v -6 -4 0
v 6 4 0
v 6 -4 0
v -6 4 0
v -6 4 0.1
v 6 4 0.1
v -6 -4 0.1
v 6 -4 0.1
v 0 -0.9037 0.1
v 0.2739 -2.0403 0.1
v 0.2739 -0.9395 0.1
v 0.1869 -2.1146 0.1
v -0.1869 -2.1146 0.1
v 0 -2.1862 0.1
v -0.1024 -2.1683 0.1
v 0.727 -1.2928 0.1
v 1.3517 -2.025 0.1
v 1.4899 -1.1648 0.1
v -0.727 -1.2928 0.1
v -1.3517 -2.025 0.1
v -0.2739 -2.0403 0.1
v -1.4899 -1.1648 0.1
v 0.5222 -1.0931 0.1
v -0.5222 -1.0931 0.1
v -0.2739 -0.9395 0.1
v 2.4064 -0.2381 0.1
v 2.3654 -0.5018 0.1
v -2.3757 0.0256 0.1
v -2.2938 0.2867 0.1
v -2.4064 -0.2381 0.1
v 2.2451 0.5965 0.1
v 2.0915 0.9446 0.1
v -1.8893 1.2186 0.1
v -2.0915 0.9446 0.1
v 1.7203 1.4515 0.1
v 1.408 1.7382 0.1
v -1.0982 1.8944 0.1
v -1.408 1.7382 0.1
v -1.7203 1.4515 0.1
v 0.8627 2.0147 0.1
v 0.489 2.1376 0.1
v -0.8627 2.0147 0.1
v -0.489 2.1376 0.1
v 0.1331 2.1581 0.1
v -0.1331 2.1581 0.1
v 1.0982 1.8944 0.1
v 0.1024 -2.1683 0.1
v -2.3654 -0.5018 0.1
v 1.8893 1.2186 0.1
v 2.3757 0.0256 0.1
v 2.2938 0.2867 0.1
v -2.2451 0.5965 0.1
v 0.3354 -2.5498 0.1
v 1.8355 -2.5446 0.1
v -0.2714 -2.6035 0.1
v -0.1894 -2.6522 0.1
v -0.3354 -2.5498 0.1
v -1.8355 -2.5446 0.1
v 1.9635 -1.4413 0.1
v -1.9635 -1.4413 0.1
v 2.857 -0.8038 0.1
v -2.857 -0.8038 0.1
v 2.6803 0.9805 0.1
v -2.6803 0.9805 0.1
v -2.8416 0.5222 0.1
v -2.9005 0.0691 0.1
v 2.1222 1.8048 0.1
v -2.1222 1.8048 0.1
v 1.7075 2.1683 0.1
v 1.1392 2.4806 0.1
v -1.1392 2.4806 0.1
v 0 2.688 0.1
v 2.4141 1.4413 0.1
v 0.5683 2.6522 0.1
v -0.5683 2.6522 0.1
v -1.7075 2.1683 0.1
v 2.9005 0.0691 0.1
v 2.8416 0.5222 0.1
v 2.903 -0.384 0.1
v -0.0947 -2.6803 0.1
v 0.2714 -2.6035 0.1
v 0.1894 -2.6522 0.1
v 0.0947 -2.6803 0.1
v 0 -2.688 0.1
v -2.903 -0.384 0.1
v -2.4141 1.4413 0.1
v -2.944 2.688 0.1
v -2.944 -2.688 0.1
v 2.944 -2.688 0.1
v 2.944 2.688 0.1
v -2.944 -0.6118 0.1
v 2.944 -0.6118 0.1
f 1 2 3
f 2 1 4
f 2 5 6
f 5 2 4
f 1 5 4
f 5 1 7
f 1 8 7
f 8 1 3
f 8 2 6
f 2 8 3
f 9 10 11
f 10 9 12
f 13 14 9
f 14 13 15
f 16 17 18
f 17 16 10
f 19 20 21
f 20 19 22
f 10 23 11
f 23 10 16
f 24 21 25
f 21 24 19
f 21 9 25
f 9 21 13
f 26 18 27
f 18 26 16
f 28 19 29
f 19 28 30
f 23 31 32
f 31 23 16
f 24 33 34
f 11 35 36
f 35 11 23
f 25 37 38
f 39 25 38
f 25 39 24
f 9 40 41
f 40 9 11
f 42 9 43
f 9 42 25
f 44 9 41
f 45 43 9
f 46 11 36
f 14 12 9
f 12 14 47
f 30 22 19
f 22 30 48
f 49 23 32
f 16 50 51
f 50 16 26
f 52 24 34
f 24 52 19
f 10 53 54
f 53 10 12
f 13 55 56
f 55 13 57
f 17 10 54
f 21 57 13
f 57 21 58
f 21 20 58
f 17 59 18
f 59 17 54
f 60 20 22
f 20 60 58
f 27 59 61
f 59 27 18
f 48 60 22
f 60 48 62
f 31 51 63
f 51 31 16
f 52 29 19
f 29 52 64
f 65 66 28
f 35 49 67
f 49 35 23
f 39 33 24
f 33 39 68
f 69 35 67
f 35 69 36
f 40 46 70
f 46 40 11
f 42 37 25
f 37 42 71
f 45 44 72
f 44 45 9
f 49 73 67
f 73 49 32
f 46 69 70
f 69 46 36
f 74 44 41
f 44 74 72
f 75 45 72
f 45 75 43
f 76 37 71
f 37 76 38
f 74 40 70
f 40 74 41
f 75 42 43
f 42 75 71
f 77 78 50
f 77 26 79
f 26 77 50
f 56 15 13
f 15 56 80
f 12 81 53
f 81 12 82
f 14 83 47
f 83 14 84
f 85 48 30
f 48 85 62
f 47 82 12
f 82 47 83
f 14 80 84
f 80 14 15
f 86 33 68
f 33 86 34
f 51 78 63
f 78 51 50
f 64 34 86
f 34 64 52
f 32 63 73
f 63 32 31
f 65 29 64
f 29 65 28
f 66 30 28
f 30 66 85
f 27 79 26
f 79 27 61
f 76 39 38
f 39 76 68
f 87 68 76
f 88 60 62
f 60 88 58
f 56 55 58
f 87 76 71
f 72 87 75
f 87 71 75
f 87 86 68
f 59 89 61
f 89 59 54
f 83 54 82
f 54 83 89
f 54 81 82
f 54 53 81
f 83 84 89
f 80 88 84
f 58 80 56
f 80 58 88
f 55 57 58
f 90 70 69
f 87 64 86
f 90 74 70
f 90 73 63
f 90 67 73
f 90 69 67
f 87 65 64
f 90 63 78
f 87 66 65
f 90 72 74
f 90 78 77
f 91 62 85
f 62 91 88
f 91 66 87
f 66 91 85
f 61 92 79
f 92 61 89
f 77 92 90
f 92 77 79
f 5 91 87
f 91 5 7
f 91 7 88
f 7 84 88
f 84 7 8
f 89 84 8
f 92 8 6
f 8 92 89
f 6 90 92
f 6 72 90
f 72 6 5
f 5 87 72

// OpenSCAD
// file: ../p/logo-shell-1971-outerbox.scad
use <../lib.scad>
function ldraw_lib__logo_shell_1971_outerbox() = [
// 0 Logo Shell 1971 Outerbox
// 0 Name: logo-shell-1971-outerbox.dat
// 0 Author: Vincent Messenet [Cheenzo]
// 0 !LDRAW_ORG Primitive UPDATE 2023-04
// 0 !LICENSE Licensed under CC BY 4.0 : see CAreadme.txt
// 
// 0 BFC CERTIFY CCW
  [0,"BFC","CERTIFY"],
  [0,"BFC","CCW"],
// 
// 0 !HISTORY 2023-06-28 [Cheenzo] Created based on 3004s60 by J. C. Tchang [tchang]
// 0 !HISTORY 2023-08-25 [OrionP] Official Update 2023-04
// 
// 
// 0 // Shell Logo 1971
// 0 // Size: x = -11.5 to 11.5 y = -10.5 to 10.5 z = 0
// 
// 3 16 -11.5 0 10.5 -8.29 0 7.05 -6.67 0 8.47
  [3,16,-11.5,0,10.5,-8.29,0,7.05,-6.67,0,8.47],
// 4 16 -7.17 0 -9.94 -7.67 0 -5.63 -11.16 0 -3.14 -11.5 0 -10.5
  [4,16,-7.17,0,-9.94,-7.67,0,-5.63,-11.16,0,-3.14,-11.5,0,-10.5],
// 3 16 -.74 0 -10.36 -1.06 0 -10.17 -7.17 0 -9.94
  [3,16,-.74,0,-10.36,-1.06,0,-10.17,-7.17,0,-9.94],
// 3 16 -11.5 0 10.5 -6.67 0 8.47 -4.45 0 9.69
  [3,16,-11.5,0,10.5,-6.67,0,8.47,-4.45,0,9.69],
// 3 16 0 0 10.5 -11.5 0 10.5 -2.22 0 10.36
  [3,16,0,0,10.5,-11.5,0,10.5,-2.22,0,10.36],
// 3 16 -11.5 0 10.5 -4.45 0 9.69 -2.22 0 10.36
  [3,16,-11.5,0,10.5,-4.45,0,9.69,-2.22,0,10.36],
// 3 16 -11.5 0 10.5 -9.43 0 5.63 -8.29 0 7.05
  [3,16,-11.5,0,10.5,-9.43,0,5.63,-8.29,0,7.05],
// 4 16 11.16 0 -3.14 7.67 0 -5.63 7.17 0 -9.94 11.5 0 -10.5
  [4,16,11.16,0,-3.14,7.67,0,-5.63,7.17,0,-9.94,11.5,0,-10.5],
// 4 16 11.5 0 -10.5 7.17 0 -9.94 .74 0 -10.36 .37 0 -10.47
  [4,16,11.5,0,-10.5,7.17,0,-9.94,.74,0,-10.36,.37,0,-10.47],
// 3 16 7.17 0 -9.94 1.06 0 -10.17 .74 0 -10.36
  [3,16,7.17,0,-9.94,1.06,0,-10.17,.74,0,-10.36],
// 3 16 7.17 0 -9.94 1.31 0 -9.96 1.06 0 -10.17
  [3,16,7.17,0,-9.94,1.31,0,-9.96,1.06,0,-10.17],
// 3 16 .37 0 -10.47 0 0 -10.5 11.5 0 -10.5
  [3,16,.37,0,-10.47,0,0,-10.5,11.5,0,-10.5],
// 3 16 -.37 0 -10.47 -11.5 0 -10.5 0 0 -10.5
  [3,16,-.37,0,-10.47,-11.5,0,-10.5,0,0,-10.5],
// 4 16 -.37 0 -10.47 -.74 0 -10.36 -7.17 0 -9.94 -11.5 0 -10.5
  [4,16,-.37,0,-10.47,-.74,0,-10.36,-7.17,0,-9.94,-11.5,0,-10.5],
// 3 16 -1.06 0 -10.17 -1.31 0 -9.96 -7.17 0 -9.94
  [3,16,-1.06,0,-10.17,-1.31,0,-9.96,-7.17,0,-9.94],
// 3 16 11.5 0 10.5 4.45 0 9.69 6.67 0 8.47
  [3,16,11.5,0,10.5,4.45,0,9.69,6.67,0,8.47],
// 3 16 -11.5 0 10.5 -10.47 0 3.83 -9.43 0 5.63
  [3,16,-11.5,0,10.5,-10.47,0,3.83,-9.43,0,5.63],
// 3 16 11.5 0 10.5 2.22 0 10.36 4.45 0 9.69
  [3,16,11.5,0,10.5,2.22,0,10.36,4.45,0,9.69],
// 3 16 11.5 0 10.5 9.43 0 5.63 10.47 0 3.83
  [3,16,11.5,0,10.5,9.43,0,5.63,10.47,0,3.83],
// 3 16 11.5 0 10.5 8.29 0 7.05 9.43 0 5.63
  [3,16,11.5,0,10.5,8.29,0,7.05,9.43,0,5.63],
// 3 16 11.5 0 10.5 6.67 0 8.47 8.29 0 7.05
  [3,16,11.5,0,10.5,6.67,0,8.47,8.29,0,7.05],
// 3 16 -11.5 0 10.5 -11.1 0 2.04 -10.47 0 3.83
  [3,16,-11.5,0,10.5,-11.1,0,2.04,-10.47,0,3.83],
// 3 16 11.5 0 10.5 10.47 0 3.83 11.1 0 2.04
  [3,16,11.5,0,10.5,10.47,0,3.83,11.1,0,2.04],
// 3 16 -11.5 0 10.5 -11.33 0 .27 -11.1 0 2.04
  [3,16,-11.5,0,10.5,-11.33,0,.27,-11.1,0,2.04],
// 3 16 11.5 0 10.5 0 0 10.5 2.22 0 10.36
  [3,16,11.5,0,10.5,0,0,10.5,2.22,0,10.36],
// 3 16 11.5 0 10.5 11.1 0 2.04 11.33 0 .27
  [3,16,11.5,0,10.5,11.1,0,2.04,11.33,0,.27],
// 4 16 -11.16 0 -3.14 -11.34 0 -1.5 -11.5 0 -2.39 -11.5 0 -10.5
  [4,16,-11.16,0,-3.14,-11.34,0,-1.5,-11.5,0,-2.39,-11.5,0,-10.5],
// 4 16 -11.34 0 -1.5 -11.33 0 .27 -11.5 0 10.5 -11.5 0 -2.39
  [4,16,-11.34,0,-1.5,-11.33,0,.27,-11.5,0,10.5,-11.5,0,-2.39],
// 4 16 11.5 0 -2.39 11.34 0 -1.5 11.16 0 -3.14 11.5 0 -10.5
  [4,16,11.5,0,-2.39,11.34,0,-1.5,11.16,0,-3.14,11.5,0,-10.5],
// 4 16 11.5 0 -2.39 11.5 0 10.5 11.33 0 .27 11.34 0 -1.5
  [4,16,11.5,0,-2.39,11.5,0,10.5,11.33,0,.27,11.34,0,-1.5],
];
module ldraw_lib__logo_shell_1971_outerbox(step=0, col=false, unit=2/5, alt=false, line=0.2, solid=!$preview)
    makepoly(ldraw_lib__logo_shell_1971_outerbox(), step=step, col=col, unit=unit, alt=alt, line=line, solid=solid);
ldraw_lib__logo_shell_1971_outerbox(line=0.2);
// file: ../p/box5-12.scad
use <../lib.scad>
function ldraw_lib__box5_12() = [
// 0 Box with 5 Faces without Any Edges
// 0 Name: box5-12.dat
// 0 Author: Chris Dee [cwdee]
// 0 !LDRAW_ORG Primitive UPDATE 2009-02
// 0 !LICENSE Licensed under CC BY 4.0 : see CAreadme.txt
// 
// 0 BFC CERTIFY CCW
  [0,"BFC","CERTIFY"],
  [0,"BFC","CCW"],
// 
// 0 !HISTORY 2009-09-03 [PTadmin] Official Update 2009-02
// 
// 
// 4 16 1 1 1 1 1 -1 -1 1 -1 -1 1 1
  [4,16,1,1,1,1,1,-1,-1,1,-1,-1,1,1],
// 4 16 -1 0 1 1 0 1 1 1 1 -1 1 1
  [4,16,-1,0,1,1,0,1,1,1,1,-1,1,1],
// 4 16 -1 0 -1 -1 0 1 -1 1 1 -1 1 -1
  [4,16,-1,0,-1,-1,0,1,-1,1,1,-1,1,-1],
// 4 16 1 0 -1 -1 0 -1 -1 1 -1 1 1 -1
  [4,16,1,0,-1,-1,0,-1,-1,1,-1,1,1,-1],
// 4 16 1 0 1 1 0 -1 1 1 -1 1 1 1
  [4,16,1,0,1,1,0,-1,1,1,-1,1,1,1],
// 0
];
module ldraw_lib__box5_12(step=0, col=false, unit=2/5, alt=false, line=0.2, solid=!$preview)
    makepoly(ldraw_lib__box5_12(), step=step, col=col, unit=unit, alt=alt, line=line, solid=solid);
ldraw_lib__box5_12(line=0.2);
// main file
use <../lib.scad>
use <../p/box5-12.scad>
use <../p/logo-shell-1971-outerbox.scad>
use <../p/logo-shell-1971.scad>
function ldraw_lib__004695a() = [
// 0 Sticker  1.0 x  1.5 with Shell Logo 1971
// 0 Name: 004695a.dat
// 0 Author: J.C. Tchang [tchang]
// 0 !LDRAW_ORG Part UPDATE 2023-04
// 0 !LICENSE Licensed under CC BY 4.0 : see CAreadme.txt
// 
// 0 BFC CERTIFY CCW
  [0,"BFC","CERTIFY"],
  [0,"BFC","CCW"],
// 
// 0 !KEYWORDS Bricklink 377.1stk01, Brickowl 327282, Rebrickable 4695, Set 377
// 
// 0 !HISTORY 2014-06-21 [PTadmin] Official Update 2014-01
// 0 !HISTORY 2023-06-30 [Cheenzo] Made use of logo prims, added keyword, updated description
// 0 !HISTORY 2023-08-25 [OrionP] Official Update 2023-04
// 
// 
// 1 16 0 -0.25 0 15 0 0 0 0.25 0 0 0 10 box5-12.dat
  [1,16,0,-0.25,0,15,0,0,0,0.25,0,0,0,10, ldraw_lib__box5_12()],
// 1 16 0 -.25 0 .64 0 0 0 1 0 0 0 .64 logo-shell-1971.dat
  [1,16,0,-.25,0,.64,0,0,0,1,0,0,0,.64, ldraw_lib__logo_shell_1971()],
// 1 15 0 -0.25 0 0.64 0 0 0 1 0 0 0 0.64 logo-shell-1971-outerbox.dat
  [1,15,0,-0.25,0,0.64,0,0,0,1,0,0,0,0.64, ldraw_lib__logo_shell_1971_outerbox()],
// 4 15 -7.36 -.25 -1.5296 -7.36 -.25 6.72 -15 -.25 10 -15 -.25 -10
  [4,15,-7.36,-.25,-1.5296,-7.36,-.25,6.72,-15,-.25,10,-15,-.25,-10],
// 3 15 -7.36 -.25 -1.5296 -15 -.25 -10 -7.36 -.25 -6.72
  [3,15,-7.36,-.25,-1.5296,-15,-.25,-10,-7.36,-.25,-6.72],
// 4 15 0 -0.25 -6.72 -7.36 -0.25 -6.72 -15 -0.25 -10 15 -0.25 -10
  [4,15,0,-0.25,-6.72,-7.36,-0.25,-6.72,-15,-0.25,-10,15,-0.25,-10],
// 3 15 7.36 -0.25 -6.72 0 -0.25 -6.72 15 -0.25 -10
  [3,15,7.36,-0.25,-6.72,0,-0.25,-6.72,15,-0.25,-10],
// 4 15 7.36 -.25 -1.5296 7.36 -.25 -6.72 15 -.25 -10 15 -.25 10
  [4,15,7.36,-.25,-1.5296,7.36,-.25,-6.72,15,-.25,-10,15,-.25,10],
// 3 15 15 -.25 10 7.36 -.25 6.72 7.36 -.25 -1.5296
  [3,15,15,-.25,10,7.36,-.25,6.72,7.36,-.25,-1.5296],
// 4 15 0 -0.25 6.72 7.36 -0.25 6.72 15 -0.25 10 -15 -0.25 10
  [4,15,0,-0.25,6.72,7.36,-0.25,6.72,15,-0.25,10,-15,-0.25,10],
// 3 15 -15 -0.25 10 -7.36 -0.25 6.72 0 -0.25 6.72
  [3,15,-15,-0.25,10,-7.36,-0.25,6.72,0,-0.25,6.72],
];
module ldraw_lib__004695a(step=0, col=false, unit=2/5, alt=false, line=0.2, solid=!$preview)
    makepoly(ldraw_lib__004695a(), step=step, col=col, unit=unit, alt=alt, line=line, solid=solid);
ldraw_lib__004695a(line=0.2);
